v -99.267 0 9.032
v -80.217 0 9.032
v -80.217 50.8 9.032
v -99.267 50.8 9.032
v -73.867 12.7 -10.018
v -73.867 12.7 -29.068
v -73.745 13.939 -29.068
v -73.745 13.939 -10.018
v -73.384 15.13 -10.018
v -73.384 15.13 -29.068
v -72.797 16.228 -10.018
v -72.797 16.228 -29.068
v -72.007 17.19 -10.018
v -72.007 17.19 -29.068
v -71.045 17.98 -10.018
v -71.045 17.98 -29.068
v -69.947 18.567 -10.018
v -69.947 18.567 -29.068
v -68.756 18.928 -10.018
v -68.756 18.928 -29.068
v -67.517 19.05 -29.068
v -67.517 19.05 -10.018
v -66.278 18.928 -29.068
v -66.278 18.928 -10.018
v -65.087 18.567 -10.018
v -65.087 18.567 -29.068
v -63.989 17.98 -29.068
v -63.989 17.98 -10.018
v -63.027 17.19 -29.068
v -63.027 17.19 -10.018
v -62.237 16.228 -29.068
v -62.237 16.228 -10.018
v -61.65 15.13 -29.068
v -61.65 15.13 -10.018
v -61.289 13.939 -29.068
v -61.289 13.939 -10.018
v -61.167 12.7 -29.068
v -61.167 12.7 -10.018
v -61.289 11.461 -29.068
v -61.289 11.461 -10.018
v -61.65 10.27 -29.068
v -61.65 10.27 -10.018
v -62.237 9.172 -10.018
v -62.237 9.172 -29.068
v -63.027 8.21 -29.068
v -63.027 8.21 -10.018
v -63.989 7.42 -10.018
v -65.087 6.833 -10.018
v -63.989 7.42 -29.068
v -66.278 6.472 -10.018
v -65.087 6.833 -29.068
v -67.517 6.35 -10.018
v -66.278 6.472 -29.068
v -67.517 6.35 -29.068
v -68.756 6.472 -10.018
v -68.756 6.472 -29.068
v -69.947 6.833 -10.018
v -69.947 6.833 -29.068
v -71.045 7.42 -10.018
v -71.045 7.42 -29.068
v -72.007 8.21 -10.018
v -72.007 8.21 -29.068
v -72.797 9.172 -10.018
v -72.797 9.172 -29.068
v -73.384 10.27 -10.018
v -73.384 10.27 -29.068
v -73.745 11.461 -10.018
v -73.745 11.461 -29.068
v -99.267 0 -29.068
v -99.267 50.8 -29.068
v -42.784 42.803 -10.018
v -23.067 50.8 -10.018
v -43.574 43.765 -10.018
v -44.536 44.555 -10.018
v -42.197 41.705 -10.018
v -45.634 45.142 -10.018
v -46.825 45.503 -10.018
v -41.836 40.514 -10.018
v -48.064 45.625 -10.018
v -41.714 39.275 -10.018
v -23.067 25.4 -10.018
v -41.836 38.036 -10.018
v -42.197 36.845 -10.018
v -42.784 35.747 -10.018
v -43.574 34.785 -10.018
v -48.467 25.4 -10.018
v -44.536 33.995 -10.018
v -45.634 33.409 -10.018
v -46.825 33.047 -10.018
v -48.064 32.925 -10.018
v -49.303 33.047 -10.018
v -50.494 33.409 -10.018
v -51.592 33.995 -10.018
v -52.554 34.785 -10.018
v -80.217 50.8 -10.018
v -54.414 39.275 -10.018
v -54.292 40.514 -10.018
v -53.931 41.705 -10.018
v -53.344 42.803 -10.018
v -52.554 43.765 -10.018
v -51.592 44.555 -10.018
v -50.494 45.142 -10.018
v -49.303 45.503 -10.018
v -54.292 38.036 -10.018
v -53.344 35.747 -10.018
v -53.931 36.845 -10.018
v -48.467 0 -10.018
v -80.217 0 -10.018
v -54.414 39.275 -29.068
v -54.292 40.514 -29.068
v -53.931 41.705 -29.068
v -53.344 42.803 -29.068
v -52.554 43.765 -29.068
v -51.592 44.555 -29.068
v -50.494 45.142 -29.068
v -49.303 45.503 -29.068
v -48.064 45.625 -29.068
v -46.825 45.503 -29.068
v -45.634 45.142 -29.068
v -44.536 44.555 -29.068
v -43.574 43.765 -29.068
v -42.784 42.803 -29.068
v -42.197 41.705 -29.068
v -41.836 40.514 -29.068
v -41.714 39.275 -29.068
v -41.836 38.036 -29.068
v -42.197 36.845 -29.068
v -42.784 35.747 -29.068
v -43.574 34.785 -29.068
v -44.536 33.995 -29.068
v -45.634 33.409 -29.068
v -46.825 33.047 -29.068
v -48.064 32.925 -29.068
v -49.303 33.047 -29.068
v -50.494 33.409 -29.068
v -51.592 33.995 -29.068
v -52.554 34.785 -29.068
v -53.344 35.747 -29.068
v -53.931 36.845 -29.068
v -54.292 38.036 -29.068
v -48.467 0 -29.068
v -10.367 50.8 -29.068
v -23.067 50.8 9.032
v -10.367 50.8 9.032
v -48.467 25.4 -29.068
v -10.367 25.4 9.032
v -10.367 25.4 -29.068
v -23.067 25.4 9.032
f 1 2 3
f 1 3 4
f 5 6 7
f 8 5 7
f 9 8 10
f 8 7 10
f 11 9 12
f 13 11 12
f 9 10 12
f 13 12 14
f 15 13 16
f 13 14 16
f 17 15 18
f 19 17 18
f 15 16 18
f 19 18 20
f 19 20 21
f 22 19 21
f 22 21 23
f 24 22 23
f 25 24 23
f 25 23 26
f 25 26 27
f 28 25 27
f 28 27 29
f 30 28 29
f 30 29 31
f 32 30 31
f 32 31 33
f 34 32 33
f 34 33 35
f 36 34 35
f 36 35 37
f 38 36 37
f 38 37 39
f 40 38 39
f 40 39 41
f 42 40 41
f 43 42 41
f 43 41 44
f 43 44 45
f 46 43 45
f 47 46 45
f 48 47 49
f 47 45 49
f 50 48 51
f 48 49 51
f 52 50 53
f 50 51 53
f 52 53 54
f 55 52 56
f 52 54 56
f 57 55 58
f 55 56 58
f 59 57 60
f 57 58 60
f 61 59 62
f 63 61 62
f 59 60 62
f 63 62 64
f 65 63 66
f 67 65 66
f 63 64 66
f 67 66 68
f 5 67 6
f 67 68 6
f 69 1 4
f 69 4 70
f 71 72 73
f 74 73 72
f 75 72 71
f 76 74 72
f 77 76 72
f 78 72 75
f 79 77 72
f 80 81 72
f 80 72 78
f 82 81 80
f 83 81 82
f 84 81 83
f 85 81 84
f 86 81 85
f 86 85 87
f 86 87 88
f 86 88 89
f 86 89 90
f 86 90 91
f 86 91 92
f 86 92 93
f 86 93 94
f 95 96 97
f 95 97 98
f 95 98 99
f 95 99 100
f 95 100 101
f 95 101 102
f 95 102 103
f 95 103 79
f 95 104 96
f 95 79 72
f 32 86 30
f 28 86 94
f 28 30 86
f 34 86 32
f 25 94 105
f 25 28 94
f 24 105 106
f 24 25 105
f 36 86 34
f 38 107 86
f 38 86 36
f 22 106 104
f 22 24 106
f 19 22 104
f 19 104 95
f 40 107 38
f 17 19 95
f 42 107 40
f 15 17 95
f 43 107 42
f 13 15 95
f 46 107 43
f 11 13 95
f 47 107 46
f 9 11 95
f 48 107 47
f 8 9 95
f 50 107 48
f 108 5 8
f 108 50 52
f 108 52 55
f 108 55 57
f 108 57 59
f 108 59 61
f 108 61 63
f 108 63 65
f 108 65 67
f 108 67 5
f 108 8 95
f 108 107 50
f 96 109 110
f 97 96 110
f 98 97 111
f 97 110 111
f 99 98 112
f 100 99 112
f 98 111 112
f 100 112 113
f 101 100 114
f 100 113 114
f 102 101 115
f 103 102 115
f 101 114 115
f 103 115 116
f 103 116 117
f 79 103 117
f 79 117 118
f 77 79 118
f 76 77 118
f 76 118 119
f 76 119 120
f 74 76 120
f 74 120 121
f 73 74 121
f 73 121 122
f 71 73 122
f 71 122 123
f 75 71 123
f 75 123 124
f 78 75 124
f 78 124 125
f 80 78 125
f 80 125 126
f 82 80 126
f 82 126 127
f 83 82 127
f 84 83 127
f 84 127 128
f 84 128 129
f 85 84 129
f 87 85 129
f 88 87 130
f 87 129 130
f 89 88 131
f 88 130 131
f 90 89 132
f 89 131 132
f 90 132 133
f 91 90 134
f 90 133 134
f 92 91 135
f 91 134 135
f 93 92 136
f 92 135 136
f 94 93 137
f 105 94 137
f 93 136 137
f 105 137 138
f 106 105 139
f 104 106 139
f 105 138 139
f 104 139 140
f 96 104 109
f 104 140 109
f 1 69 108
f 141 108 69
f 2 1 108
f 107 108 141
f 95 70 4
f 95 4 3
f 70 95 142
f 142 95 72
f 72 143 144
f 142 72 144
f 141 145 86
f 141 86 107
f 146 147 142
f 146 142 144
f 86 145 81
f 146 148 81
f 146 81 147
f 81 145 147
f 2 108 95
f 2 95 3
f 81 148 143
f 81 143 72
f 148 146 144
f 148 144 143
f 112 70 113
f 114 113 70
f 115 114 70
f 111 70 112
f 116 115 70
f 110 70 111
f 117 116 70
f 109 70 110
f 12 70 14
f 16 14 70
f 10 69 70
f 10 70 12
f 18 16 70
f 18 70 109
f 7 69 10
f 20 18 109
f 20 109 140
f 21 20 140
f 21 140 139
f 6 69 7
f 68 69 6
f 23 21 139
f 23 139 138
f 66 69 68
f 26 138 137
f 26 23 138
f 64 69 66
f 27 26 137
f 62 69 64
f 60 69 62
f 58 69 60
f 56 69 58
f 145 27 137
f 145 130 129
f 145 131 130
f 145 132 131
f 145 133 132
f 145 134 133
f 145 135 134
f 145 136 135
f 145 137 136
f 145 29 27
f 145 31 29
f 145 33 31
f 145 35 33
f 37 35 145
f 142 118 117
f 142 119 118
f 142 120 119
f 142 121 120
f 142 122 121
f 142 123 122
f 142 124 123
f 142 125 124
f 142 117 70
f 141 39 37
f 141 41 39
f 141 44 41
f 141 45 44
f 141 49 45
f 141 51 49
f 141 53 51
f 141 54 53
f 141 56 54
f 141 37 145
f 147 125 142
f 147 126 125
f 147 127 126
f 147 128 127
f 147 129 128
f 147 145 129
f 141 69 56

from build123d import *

# Parameters (mm, degrees)
F1_DEPTH = 50.8
F2_W     = 38.1
F2_H     = 25.4
F3_DEPTH = 39.21464
F5_D     = 12.7
F7_D     = 12.7


with BuildPart() as f1:
    # F0 (on Front) → F1 (new body)
    with BuildSketch(Plane.XZ):
        Polygon((-80.216871, 9.032293), (-99.266871, 9.032293), (-99.266871, -29.067707), (-10.366871, -29.067707), (-10.366871, 9.032293), (-23.066871, 9.032293), (-23.066871, -10.017707), (-80.216871, -10.017707), align=None)
    extrude(amount=-F1_DEPTH)

    # F2 (on face) → F3 (cut)
    with BuildSketch(Plane(origin=(0, 0, -29.067707), x_dir=(1, 0, 0), z_dir=(0, 0, -1))):
        with Locations((-29.416871, -12.7)):
            Rectangle(F2_W, F2_H)
    extrude(amount=-F3_DEPTH, mode=Mode.SUBTRACT)

    # F5 (through all)
    with Locations(Plane.XY.offset(-10.017707)):
        with Locations((-67.516871, 12.7)):
            Hole(F5_D / 2)

    # F7 (through all)
    with Locations(Plane.XY.offset(-10.017707)):
        with Locations((-48.063979, 39.275229)):
            Hole(F7_D / 2)


solid = f1.part
